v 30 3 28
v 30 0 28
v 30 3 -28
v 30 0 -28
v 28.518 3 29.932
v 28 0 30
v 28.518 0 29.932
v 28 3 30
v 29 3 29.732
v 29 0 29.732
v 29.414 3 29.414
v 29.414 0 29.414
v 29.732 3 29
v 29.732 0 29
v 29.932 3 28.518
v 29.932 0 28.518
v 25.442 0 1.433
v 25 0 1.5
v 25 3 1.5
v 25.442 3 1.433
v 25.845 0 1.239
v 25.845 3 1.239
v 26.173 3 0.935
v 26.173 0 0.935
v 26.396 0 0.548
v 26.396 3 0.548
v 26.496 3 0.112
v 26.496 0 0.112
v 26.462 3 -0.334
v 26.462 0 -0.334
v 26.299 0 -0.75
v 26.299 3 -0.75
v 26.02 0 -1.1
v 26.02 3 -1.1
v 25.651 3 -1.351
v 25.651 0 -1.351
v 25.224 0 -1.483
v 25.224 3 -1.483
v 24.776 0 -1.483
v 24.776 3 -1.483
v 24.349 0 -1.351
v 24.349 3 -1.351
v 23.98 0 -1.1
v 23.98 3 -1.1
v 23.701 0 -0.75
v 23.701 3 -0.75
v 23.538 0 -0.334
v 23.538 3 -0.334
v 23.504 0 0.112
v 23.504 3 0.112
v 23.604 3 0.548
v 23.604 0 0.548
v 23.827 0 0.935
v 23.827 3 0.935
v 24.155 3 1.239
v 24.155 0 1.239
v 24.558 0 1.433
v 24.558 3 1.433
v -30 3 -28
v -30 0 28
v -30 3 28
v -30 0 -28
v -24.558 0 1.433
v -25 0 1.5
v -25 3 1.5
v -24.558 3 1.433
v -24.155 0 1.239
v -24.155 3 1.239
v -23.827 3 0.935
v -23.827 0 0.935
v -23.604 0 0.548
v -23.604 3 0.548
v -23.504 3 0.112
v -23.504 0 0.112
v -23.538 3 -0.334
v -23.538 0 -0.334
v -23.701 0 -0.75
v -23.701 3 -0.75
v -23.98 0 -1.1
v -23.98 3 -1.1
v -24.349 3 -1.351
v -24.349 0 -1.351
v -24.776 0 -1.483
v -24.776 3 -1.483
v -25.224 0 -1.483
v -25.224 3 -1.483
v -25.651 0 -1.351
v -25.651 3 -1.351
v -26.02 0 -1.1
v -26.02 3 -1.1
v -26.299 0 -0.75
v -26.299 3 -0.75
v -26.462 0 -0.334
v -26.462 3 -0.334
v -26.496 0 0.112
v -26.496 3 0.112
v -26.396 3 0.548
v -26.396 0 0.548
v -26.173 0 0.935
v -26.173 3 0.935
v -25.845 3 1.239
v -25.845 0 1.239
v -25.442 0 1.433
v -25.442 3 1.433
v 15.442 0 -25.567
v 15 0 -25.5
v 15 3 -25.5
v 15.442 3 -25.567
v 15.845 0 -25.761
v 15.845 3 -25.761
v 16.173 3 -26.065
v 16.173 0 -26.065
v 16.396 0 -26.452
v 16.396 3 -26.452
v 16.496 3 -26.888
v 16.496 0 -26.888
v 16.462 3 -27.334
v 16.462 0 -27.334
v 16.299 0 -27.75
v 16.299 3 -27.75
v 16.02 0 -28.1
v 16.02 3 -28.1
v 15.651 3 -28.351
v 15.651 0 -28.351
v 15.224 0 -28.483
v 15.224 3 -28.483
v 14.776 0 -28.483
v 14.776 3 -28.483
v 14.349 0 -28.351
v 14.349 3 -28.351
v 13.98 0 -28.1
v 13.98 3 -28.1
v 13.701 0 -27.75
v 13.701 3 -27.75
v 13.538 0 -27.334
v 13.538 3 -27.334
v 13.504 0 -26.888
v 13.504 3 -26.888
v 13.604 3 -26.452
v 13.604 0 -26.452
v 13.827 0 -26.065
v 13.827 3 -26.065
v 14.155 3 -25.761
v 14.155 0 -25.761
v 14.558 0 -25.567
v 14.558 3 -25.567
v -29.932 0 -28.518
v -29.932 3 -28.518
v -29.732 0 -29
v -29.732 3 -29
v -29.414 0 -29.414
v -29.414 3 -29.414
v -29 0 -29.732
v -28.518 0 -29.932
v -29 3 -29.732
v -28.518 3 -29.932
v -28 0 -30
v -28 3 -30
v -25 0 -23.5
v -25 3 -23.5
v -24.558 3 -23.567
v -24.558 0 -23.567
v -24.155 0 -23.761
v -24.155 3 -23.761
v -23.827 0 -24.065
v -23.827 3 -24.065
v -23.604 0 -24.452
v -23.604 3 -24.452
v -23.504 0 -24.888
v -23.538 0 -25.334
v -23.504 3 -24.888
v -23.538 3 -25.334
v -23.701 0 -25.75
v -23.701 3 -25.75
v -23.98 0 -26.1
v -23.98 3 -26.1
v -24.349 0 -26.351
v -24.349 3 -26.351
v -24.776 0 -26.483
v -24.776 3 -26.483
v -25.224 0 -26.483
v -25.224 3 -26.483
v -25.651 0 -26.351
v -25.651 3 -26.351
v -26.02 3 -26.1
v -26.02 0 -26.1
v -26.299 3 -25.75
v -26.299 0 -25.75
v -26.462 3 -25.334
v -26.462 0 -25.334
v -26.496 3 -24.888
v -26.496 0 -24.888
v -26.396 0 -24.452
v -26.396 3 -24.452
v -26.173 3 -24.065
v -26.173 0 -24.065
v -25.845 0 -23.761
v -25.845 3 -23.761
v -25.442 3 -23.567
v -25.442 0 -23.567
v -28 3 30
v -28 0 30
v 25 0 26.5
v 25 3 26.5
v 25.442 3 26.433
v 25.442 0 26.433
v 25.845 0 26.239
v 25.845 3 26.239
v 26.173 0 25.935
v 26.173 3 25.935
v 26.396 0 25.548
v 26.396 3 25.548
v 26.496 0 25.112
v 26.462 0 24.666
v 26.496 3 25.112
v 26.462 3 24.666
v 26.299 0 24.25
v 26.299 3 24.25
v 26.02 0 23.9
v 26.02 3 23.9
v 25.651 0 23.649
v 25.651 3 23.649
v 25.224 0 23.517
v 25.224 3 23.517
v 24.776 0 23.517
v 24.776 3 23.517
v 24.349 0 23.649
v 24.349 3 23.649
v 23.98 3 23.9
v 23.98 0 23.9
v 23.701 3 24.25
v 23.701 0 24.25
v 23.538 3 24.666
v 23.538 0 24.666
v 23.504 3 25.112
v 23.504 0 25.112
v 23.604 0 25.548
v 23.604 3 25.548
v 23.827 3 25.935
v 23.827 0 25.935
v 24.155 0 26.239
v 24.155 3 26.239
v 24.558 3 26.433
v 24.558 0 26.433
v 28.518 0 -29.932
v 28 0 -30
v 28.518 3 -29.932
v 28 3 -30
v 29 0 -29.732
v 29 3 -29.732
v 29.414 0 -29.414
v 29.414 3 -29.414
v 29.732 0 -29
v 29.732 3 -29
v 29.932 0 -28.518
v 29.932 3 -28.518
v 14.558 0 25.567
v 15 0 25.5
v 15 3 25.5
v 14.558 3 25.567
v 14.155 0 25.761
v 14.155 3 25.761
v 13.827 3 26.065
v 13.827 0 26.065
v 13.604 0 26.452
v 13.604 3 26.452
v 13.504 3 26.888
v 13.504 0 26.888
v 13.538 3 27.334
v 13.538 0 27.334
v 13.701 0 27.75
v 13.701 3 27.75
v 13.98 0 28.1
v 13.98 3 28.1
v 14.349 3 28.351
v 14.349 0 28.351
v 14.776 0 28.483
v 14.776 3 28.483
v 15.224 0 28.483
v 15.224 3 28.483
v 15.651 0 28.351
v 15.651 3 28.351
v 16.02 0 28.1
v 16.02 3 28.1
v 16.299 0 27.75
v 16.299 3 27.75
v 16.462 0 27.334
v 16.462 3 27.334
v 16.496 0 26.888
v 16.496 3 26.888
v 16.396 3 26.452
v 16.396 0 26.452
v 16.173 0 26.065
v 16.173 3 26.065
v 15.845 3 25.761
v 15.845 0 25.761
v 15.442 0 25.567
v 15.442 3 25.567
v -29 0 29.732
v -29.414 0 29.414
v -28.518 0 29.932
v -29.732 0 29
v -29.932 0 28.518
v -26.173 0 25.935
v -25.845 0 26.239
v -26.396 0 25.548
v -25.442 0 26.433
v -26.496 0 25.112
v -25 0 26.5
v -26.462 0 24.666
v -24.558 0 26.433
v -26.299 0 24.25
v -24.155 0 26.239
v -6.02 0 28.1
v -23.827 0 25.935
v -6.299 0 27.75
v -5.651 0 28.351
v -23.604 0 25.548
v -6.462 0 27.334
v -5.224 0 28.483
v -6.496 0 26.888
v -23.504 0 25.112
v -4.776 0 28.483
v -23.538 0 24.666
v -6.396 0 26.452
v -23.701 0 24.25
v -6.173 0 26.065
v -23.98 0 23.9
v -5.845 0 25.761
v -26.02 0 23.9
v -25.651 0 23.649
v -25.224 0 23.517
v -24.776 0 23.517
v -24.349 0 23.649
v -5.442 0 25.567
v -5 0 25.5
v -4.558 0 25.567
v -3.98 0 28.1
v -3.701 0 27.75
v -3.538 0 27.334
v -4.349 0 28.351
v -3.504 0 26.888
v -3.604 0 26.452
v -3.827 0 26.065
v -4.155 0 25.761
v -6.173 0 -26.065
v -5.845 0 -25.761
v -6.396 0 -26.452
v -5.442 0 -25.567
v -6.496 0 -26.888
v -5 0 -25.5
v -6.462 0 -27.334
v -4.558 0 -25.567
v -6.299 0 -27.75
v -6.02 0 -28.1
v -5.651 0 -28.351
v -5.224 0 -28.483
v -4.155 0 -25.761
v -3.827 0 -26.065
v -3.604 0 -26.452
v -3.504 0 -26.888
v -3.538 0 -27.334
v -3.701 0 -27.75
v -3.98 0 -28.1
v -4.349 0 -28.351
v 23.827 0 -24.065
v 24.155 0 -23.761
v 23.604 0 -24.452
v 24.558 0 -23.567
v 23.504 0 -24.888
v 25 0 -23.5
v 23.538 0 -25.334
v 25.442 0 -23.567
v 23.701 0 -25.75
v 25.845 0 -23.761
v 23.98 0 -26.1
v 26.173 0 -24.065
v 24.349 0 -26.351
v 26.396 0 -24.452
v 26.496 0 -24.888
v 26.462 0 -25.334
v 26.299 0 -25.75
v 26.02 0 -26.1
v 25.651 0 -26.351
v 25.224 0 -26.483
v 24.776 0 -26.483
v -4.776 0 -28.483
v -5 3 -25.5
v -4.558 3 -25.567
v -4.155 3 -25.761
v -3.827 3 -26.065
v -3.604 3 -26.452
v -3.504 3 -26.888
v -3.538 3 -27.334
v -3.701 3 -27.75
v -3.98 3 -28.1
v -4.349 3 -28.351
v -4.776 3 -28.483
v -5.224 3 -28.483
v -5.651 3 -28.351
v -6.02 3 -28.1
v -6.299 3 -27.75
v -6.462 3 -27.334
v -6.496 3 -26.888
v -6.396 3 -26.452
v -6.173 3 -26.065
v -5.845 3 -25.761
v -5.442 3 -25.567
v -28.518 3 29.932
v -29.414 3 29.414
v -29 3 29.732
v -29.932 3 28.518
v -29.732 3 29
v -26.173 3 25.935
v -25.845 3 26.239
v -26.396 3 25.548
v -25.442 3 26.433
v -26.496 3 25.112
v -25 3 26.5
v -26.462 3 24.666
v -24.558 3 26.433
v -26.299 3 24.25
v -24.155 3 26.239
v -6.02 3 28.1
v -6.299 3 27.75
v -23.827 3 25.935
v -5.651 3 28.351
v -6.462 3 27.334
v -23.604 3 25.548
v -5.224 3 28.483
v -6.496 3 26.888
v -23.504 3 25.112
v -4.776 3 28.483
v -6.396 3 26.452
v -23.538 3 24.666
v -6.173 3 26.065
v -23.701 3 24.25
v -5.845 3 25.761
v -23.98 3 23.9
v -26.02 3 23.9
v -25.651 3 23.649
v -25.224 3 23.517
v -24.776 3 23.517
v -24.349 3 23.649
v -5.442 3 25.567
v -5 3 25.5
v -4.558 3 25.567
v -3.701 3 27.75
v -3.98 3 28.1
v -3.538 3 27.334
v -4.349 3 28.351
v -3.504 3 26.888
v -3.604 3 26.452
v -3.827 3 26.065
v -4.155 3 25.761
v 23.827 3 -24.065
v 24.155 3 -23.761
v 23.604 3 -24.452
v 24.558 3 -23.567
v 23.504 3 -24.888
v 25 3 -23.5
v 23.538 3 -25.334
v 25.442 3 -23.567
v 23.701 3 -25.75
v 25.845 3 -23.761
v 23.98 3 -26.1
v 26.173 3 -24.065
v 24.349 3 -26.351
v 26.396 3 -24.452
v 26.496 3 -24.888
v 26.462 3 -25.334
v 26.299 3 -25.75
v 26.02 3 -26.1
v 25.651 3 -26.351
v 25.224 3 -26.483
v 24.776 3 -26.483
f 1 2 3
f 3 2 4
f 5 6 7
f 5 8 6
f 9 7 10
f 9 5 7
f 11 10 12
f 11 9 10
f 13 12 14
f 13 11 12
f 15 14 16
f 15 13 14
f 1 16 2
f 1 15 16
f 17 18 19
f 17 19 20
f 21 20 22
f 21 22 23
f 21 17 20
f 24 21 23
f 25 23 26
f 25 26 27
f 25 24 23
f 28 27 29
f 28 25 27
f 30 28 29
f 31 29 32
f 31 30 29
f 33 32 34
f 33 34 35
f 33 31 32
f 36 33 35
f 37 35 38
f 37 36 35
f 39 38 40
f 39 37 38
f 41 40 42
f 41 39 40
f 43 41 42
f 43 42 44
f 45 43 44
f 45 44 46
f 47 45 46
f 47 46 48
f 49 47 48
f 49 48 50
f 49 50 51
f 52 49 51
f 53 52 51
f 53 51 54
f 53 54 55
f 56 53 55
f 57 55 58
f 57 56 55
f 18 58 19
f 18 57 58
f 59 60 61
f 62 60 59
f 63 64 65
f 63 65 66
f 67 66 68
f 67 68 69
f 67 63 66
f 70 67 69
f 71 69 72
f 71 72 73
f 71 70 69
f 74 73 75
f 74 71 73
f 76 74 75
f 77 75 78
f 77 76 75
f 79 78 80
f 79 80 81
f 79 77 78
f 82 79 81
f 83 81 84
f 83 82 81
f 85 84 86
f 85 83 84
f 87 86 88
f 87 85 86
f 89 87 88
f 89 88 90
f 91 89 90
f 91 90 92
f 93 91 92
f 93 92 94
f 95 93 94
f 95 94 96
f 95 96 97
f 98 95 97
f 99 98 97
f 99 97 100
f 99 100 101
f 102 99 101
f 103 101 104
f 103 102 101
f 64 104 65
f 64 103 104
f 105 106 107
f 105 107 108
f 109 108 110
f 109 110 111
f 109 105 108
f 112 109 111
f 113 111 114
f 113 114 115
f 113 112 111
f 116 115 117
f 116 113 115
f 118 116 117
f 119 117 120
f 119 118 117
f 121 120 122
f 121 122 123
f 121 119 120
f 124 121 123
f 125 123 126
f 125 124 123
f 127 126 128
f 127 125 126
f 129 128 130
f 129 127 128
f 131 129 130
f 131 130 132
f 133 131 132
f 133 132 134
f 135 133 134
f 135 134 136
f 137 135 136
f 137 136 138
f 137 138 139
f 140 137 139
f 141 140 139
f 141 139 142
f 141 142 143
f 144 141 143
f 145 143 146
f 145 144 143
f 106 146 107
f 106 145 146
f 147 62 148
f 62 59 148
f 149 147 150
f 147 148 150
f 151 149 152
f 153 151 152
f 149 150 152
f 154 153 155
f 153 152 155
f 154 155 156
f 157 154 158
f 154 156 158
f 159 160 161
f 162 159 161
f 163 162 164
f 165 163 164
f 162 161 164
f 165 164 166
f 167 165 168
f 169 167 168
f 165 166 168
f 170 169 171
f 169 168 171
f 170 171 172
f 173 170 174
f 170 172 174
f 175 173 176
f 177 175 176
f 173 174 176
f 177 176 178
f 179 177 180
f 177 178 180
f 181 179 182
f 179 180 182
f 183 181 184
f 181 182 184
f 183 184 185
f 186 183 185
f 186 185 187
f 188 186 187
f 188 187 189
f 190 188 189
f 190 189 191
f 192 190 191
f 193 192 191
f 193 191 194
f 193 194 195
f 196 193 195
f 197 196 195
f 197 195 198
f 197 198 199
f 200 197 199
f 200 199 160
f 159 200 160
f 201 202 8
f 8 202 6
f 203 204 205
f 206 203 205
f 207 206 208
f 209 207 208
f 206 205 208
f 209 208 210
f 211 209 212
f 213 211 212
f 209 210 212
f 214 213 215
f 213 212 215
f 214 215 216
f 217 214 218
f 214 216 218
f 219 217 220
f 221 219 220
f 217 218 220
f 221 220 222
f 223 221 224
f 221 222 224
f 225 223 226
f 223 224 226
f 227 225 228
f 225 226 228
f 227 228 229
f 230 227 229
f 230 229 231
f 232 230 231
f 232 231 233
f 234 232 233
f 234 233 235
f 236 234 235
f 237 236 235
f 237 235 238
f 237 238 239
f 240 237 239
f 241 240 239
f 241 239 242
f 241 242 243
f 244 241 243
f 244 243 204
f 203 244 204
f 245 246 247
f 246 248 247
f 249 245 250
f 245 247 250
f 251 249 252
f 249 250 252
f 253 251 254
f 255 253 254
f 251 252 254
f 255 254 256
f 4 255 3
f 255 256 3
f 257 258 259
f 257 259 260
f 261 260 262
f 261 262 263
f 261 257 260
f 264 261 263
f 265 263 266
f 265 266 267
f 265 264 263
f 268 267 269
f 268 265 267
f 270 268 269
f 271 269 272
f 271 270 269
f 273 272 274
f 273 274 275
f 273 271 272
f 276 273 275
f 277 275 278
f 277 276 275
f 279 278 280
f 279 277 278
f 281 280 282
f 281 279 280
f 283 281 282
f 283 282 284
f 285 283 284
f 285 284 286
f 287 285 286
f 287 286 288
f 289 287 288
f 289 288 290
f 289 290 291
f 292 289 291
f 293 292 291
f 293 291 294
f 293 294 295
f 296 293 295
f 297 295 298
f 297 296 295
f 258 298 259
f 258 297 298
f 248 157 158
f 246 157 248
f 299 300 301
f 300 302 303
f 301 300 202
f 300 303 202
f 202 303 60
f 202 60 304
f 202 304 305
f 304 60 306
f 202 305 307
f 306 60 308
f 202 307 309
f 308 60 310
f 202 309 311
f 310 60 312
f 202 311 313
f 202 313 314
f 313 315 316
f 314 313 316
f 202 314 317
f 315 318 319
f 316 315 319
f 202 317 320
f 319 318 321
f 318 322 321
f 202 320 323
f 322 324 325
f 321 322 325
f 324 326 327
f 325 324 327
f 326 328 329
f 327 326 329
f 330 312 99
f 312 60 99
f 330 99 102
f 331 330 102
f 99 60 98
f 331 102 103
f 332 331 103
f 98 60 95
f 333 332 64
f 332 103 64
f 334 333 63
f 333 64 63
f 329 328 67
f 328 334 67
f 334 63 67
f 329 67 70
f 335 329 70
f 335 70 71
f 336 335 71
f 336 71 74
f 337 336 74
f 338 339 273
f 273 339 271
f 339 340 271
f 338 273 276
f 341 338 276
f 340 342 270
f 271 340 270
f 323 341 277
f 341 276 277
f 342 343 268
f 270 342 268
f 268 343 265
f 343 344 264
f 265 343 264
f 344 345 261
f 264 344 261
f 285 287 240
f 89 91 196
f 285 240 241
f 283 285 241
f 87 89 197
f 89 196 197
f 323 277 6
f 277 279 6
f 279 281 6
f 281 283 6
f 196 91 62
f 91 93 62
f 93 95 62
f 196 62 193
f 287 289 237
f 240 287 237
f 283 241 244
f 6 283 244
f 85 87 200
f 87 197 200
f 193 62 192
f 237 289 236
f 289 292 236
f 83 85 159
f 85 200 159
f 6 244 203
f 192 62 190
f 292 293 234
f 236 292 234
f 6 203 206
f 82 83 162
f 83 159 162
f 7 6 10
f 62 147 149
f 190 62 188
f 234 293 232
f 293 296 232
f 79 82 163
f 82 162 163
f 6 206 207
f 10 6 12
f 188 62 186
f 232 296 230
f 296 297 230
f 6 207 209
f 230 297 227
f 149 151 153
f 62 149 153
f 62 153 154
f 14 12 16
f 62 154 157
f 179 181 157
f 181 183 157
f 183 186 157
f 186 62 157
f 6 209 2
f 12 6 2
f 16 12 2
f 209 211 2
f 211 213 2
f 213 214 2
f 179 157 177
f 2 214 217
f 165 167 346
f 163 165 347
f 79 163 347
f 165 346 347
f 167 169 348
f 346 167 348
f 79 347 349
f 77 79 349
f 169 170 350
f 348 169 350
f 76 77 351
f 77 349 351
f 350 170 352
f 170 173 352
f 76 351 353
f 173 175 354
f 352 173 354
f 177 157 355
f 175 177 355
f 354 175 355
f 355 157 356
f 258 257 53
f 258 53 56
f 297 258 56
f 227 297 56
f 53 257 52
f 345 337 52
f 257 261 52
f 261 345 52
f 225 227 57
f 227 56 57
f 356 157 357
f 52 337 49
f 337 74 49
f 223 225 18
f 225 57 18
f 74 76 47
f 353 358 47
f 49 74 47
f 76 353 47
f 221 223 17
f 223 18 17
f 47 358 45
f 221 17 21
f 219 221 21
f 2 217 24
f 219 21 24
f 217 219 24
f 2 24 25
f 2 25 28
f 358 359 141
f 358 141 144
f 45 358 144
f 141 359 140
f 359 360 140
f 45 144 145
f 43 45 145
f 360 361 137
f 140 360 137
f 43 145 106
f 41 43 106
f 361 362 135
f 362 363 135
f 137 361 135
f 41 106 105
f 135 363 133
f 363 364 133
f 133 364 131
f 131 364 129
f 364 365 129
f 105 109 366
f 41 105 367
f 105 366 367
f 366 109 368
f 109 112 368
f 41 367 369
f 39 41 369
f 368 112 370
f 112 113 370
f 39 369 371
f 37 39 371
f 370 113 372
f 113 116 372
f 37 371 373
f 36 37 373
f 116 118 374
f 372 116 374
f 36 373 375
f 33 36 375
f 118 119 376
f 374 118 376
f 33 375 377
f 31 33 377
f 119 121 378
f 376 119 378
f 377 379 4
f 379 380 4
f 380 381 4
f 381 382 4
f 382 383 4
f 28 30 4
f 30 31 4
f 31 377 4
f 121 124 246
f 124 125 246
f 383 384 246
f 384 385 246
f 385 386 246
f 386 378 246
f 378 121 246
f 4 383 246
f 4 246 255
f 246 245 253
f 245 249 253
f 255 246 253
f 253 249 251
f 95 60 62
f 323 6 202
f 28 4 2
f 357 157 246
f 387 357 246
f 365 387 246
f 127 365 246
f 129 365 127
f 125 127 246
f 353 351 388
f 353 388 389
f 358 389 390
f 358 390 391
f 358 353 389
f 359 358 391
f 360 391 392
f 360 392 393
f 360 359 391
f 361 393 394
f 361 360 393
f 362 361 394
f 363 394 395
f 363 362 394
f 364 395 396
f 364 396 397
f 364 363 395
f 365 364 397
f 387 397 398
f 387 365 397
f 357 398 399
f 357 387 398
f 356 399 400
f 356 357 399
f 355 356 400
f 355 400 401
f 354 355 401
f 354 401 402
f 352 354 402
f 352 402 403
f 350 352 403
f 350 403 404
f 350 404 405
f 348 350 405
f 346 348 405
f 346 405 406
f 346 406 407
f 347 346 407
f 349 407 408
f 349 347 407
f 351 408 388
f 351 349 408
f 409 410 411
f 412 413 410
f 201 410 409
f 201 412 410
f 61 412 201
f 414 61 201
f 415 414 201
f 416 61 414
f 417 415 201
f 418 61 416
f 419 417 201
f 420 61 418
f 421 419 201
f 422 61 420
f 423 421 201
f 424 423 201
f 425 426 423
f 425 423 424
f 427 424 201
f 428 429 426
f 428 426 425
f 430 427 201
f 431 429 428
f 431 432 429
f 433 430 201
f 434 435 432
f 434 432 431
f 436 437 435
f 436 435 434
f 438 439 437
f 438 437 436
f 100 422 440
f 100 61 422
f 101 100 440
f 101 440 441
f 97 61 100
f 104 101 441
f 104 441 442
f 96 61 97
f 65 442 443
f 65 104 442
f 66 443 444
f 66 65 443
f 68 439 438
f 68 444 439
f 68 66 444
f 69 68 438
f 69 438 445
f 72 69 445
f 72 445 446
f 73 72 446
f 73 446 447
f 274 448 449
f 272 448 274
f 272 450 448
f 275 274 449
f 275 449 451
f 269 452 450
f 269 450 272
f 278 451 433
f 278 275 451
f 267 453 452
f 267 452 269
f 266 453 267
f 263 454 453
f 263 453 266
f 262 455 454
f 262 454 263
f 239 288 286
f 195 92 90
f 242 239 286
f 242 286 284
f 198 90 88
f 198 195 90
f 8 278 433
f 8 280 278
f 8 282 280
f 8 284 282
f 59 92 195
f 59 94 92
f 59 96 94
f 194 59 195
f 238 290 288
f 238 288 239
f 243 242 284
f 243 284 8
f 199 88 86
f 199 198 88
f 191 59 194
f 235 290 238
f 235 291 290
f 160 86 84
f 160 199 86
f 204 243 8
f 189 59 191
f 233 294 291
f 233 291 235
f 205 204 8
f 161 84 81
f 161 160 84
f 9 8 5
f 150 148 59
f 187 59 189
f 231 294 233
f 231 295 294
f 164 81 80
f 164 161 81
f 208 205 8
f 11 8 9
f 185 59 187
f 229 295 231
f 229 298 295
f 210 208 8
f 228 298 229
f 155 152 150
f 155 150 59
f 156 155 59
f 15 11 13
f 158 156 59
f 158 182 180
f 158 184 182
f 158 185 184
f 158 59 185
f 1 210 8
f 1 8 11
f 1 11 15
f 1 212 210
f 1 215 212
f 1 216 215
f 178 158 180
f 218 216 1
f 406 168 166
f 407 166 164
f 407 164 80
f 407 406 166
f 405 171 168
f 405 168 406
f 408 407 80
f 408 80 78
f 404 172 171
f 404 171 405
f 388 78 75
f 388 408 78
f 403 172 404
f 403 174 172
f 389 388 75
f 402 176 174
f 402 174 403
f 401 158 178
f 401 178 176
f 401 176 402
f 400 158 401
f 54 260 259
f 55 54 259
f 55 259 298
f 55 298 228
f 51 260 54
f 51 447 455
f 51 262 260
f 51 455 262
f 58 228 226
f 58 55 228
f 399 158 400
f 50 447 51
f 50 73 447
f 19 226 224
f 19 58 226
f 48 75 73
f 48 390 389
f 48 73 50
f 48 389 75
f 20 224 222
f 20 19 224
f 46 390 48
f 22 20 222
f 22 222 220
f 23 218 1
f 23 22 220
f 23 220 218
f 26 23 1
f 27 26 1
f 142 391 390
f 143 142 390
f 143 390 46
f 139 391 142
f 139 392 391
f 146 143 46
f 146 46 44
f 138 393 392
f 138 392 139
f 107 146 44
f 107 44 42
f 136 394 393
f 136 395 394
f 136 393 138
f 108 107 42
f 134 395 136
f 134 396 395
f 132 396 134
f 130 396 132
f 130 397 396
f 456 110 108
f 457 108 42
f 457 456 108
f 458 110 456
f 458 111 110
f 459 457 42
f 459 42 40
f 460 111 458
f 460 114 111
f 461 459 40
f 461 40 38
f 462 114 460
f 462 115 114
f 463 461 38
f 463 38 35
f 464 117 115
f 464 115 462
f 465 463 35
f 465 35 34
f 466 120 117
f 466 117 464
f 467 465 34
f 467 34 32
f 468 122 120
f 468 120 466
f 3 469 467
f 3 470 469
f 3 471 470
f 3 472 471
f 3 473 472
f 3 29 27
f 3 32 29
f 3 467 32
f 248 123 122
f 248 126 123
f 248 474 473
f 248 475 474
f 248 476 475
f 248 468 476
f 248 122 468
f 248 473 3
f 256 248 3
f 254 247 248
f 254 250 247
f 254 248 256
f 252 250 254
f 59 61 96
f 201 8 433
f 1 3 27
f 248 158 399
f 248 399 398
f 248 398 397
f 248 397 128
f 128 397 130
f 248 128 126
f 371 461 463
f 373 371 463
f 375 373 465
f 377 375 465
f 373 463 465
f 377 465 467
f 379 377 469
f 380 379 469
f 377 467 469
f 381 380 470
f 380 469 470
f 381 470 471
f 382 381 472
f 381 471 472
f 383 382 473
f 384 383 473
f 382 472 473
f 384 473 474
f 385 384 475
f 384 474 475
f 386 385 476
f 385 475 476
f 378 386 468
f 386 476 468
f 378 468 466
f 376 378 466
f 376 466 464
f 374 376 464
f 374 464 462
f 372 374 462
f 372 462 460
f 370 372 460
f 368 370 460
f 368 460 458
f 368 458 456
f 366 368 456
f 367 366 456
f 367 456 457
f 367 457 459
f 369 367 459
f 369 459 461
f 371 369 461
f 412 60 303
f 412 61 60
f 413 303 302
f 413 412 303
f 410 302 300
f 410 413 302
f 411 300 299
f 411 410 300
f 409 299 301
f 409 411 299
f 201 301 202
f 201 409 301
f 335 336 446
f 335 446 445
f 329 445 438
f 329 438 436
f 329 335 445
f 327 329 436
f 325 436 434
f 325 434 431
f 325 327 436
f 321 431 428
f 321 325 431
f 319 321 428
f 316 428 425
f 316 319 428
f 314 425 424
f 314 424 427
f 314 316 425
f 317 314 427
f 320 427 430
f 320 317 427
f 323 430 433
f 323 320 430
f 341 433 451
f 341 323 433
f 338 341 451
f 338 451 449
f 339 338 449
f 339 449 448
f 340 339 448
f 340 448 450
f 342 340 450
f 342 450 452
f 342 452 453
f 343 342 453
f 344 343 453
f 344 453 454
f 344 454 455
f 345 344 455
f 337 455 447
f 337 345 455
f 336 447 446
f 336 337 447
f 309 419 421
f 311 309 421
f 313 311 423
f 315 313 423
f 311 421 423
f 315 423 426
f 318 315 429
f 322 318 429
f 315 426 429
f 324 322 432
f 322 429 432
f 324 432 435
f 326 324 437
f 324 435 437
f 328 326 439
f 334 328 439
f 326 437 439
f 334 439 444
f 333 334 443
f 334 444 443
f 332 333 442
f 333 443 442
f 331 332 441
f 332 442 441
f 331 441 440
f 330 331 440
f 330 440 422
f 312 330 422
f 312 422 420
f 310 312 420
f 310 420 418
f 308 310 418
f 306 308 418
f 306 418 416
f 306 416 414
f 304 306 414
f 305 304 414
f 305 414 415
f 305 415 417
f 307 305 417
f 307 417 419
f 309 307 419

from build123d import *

# Parameters (mm, degrees)
SKETCH_1_W          = 60
SKETCH_1_H          = 60
SKETCH_1_R          = 1.5
EXTRUDE_1_DEPTH     = 3
SKETCH_2_R          = 1.5
CUT_EXTRUDE_1_DEPTH = 10
FILLET_1_R          = 2


with BuildPart() as part:
    # 草图1 → 凸台-拉伸1 (new body)
    with BuildSketch(Plane(origin=(0, 0, 0), x_dir=(1, 0, 0), z_dir=(0, 1, 0))):
        Rectangle(SKETCH_1_W, SKETCH_1_H)
        with Locations(Location((-5, 27, 0), (0, 0, 270))):
            Circle(SKETCH_1_R, mode=Mode.SUBTRACT)
        with Locations(Location((15, 27, 0), (0, 0, 270))):
            Circle(SKETCH_1_R, mode=Mode.SUBTRACT)
        with Locations(Location((15, -27, 0), (0, 0, 90))):
            Circle(SKETCH_1_R, mode=Mode.SUBTRACT)
        with Locations(Location((-5, -27, 0), (0, 0, 90))):
            Circle(SKETCH_1_R, mode=Mode.SUBTRACT)
        with Locations(Location((-25, 0, 0), (0, 0, 270))):
            Circle(SKETCH_1_R, mode=Mode.SUBTRACT)
        with Locations(Location((25, 0, 0), (0, 0, 270))):
            Circle(SKETCH_1_R, mode=Mode.SUBTRACT)
    extrude(amount=EXTRUDE_1_DEPTH)

    # 草图2 → 切除-拉伸1 (cut)
    with BuildSketch(Plane(origin=(0, 3, 0), x_dir=(1, 0, 0), z_dir=(0, 1, 0))):
        with Locations(Location((-25, 25, 0), (0, 0, 270))):
            Circle(SKETCH_2_R)
        with Locations(Location((25, 25, 0), (0, 0, 270))):
            Circle(SKETCH_2_R)
        with Locations(Location((-25, -25, 0), (0, 0, 270))):
            Circle(SKETCH_2_R)
        with Locations(Location((25, -25, 0), (0, 0, 270))):
            Circle(SKETCH_2_R)
    extrude(amount=-CUT_EXTRUDE_1_DEPTH, mode=Mode.SUBTRACT)

    # 圆角1
    fillet_1_edges = [part.edges().sort_by_distance(p)[0] for p in [
        (30, 1.5, 30),
        (-30, 1.5, 30),
        (-30, 1.5, -30),
        (30, 1.5, -30),
    ]]
    fillet(fillet_1_edges, radius=FILLET_1_R)


solid = part.part
